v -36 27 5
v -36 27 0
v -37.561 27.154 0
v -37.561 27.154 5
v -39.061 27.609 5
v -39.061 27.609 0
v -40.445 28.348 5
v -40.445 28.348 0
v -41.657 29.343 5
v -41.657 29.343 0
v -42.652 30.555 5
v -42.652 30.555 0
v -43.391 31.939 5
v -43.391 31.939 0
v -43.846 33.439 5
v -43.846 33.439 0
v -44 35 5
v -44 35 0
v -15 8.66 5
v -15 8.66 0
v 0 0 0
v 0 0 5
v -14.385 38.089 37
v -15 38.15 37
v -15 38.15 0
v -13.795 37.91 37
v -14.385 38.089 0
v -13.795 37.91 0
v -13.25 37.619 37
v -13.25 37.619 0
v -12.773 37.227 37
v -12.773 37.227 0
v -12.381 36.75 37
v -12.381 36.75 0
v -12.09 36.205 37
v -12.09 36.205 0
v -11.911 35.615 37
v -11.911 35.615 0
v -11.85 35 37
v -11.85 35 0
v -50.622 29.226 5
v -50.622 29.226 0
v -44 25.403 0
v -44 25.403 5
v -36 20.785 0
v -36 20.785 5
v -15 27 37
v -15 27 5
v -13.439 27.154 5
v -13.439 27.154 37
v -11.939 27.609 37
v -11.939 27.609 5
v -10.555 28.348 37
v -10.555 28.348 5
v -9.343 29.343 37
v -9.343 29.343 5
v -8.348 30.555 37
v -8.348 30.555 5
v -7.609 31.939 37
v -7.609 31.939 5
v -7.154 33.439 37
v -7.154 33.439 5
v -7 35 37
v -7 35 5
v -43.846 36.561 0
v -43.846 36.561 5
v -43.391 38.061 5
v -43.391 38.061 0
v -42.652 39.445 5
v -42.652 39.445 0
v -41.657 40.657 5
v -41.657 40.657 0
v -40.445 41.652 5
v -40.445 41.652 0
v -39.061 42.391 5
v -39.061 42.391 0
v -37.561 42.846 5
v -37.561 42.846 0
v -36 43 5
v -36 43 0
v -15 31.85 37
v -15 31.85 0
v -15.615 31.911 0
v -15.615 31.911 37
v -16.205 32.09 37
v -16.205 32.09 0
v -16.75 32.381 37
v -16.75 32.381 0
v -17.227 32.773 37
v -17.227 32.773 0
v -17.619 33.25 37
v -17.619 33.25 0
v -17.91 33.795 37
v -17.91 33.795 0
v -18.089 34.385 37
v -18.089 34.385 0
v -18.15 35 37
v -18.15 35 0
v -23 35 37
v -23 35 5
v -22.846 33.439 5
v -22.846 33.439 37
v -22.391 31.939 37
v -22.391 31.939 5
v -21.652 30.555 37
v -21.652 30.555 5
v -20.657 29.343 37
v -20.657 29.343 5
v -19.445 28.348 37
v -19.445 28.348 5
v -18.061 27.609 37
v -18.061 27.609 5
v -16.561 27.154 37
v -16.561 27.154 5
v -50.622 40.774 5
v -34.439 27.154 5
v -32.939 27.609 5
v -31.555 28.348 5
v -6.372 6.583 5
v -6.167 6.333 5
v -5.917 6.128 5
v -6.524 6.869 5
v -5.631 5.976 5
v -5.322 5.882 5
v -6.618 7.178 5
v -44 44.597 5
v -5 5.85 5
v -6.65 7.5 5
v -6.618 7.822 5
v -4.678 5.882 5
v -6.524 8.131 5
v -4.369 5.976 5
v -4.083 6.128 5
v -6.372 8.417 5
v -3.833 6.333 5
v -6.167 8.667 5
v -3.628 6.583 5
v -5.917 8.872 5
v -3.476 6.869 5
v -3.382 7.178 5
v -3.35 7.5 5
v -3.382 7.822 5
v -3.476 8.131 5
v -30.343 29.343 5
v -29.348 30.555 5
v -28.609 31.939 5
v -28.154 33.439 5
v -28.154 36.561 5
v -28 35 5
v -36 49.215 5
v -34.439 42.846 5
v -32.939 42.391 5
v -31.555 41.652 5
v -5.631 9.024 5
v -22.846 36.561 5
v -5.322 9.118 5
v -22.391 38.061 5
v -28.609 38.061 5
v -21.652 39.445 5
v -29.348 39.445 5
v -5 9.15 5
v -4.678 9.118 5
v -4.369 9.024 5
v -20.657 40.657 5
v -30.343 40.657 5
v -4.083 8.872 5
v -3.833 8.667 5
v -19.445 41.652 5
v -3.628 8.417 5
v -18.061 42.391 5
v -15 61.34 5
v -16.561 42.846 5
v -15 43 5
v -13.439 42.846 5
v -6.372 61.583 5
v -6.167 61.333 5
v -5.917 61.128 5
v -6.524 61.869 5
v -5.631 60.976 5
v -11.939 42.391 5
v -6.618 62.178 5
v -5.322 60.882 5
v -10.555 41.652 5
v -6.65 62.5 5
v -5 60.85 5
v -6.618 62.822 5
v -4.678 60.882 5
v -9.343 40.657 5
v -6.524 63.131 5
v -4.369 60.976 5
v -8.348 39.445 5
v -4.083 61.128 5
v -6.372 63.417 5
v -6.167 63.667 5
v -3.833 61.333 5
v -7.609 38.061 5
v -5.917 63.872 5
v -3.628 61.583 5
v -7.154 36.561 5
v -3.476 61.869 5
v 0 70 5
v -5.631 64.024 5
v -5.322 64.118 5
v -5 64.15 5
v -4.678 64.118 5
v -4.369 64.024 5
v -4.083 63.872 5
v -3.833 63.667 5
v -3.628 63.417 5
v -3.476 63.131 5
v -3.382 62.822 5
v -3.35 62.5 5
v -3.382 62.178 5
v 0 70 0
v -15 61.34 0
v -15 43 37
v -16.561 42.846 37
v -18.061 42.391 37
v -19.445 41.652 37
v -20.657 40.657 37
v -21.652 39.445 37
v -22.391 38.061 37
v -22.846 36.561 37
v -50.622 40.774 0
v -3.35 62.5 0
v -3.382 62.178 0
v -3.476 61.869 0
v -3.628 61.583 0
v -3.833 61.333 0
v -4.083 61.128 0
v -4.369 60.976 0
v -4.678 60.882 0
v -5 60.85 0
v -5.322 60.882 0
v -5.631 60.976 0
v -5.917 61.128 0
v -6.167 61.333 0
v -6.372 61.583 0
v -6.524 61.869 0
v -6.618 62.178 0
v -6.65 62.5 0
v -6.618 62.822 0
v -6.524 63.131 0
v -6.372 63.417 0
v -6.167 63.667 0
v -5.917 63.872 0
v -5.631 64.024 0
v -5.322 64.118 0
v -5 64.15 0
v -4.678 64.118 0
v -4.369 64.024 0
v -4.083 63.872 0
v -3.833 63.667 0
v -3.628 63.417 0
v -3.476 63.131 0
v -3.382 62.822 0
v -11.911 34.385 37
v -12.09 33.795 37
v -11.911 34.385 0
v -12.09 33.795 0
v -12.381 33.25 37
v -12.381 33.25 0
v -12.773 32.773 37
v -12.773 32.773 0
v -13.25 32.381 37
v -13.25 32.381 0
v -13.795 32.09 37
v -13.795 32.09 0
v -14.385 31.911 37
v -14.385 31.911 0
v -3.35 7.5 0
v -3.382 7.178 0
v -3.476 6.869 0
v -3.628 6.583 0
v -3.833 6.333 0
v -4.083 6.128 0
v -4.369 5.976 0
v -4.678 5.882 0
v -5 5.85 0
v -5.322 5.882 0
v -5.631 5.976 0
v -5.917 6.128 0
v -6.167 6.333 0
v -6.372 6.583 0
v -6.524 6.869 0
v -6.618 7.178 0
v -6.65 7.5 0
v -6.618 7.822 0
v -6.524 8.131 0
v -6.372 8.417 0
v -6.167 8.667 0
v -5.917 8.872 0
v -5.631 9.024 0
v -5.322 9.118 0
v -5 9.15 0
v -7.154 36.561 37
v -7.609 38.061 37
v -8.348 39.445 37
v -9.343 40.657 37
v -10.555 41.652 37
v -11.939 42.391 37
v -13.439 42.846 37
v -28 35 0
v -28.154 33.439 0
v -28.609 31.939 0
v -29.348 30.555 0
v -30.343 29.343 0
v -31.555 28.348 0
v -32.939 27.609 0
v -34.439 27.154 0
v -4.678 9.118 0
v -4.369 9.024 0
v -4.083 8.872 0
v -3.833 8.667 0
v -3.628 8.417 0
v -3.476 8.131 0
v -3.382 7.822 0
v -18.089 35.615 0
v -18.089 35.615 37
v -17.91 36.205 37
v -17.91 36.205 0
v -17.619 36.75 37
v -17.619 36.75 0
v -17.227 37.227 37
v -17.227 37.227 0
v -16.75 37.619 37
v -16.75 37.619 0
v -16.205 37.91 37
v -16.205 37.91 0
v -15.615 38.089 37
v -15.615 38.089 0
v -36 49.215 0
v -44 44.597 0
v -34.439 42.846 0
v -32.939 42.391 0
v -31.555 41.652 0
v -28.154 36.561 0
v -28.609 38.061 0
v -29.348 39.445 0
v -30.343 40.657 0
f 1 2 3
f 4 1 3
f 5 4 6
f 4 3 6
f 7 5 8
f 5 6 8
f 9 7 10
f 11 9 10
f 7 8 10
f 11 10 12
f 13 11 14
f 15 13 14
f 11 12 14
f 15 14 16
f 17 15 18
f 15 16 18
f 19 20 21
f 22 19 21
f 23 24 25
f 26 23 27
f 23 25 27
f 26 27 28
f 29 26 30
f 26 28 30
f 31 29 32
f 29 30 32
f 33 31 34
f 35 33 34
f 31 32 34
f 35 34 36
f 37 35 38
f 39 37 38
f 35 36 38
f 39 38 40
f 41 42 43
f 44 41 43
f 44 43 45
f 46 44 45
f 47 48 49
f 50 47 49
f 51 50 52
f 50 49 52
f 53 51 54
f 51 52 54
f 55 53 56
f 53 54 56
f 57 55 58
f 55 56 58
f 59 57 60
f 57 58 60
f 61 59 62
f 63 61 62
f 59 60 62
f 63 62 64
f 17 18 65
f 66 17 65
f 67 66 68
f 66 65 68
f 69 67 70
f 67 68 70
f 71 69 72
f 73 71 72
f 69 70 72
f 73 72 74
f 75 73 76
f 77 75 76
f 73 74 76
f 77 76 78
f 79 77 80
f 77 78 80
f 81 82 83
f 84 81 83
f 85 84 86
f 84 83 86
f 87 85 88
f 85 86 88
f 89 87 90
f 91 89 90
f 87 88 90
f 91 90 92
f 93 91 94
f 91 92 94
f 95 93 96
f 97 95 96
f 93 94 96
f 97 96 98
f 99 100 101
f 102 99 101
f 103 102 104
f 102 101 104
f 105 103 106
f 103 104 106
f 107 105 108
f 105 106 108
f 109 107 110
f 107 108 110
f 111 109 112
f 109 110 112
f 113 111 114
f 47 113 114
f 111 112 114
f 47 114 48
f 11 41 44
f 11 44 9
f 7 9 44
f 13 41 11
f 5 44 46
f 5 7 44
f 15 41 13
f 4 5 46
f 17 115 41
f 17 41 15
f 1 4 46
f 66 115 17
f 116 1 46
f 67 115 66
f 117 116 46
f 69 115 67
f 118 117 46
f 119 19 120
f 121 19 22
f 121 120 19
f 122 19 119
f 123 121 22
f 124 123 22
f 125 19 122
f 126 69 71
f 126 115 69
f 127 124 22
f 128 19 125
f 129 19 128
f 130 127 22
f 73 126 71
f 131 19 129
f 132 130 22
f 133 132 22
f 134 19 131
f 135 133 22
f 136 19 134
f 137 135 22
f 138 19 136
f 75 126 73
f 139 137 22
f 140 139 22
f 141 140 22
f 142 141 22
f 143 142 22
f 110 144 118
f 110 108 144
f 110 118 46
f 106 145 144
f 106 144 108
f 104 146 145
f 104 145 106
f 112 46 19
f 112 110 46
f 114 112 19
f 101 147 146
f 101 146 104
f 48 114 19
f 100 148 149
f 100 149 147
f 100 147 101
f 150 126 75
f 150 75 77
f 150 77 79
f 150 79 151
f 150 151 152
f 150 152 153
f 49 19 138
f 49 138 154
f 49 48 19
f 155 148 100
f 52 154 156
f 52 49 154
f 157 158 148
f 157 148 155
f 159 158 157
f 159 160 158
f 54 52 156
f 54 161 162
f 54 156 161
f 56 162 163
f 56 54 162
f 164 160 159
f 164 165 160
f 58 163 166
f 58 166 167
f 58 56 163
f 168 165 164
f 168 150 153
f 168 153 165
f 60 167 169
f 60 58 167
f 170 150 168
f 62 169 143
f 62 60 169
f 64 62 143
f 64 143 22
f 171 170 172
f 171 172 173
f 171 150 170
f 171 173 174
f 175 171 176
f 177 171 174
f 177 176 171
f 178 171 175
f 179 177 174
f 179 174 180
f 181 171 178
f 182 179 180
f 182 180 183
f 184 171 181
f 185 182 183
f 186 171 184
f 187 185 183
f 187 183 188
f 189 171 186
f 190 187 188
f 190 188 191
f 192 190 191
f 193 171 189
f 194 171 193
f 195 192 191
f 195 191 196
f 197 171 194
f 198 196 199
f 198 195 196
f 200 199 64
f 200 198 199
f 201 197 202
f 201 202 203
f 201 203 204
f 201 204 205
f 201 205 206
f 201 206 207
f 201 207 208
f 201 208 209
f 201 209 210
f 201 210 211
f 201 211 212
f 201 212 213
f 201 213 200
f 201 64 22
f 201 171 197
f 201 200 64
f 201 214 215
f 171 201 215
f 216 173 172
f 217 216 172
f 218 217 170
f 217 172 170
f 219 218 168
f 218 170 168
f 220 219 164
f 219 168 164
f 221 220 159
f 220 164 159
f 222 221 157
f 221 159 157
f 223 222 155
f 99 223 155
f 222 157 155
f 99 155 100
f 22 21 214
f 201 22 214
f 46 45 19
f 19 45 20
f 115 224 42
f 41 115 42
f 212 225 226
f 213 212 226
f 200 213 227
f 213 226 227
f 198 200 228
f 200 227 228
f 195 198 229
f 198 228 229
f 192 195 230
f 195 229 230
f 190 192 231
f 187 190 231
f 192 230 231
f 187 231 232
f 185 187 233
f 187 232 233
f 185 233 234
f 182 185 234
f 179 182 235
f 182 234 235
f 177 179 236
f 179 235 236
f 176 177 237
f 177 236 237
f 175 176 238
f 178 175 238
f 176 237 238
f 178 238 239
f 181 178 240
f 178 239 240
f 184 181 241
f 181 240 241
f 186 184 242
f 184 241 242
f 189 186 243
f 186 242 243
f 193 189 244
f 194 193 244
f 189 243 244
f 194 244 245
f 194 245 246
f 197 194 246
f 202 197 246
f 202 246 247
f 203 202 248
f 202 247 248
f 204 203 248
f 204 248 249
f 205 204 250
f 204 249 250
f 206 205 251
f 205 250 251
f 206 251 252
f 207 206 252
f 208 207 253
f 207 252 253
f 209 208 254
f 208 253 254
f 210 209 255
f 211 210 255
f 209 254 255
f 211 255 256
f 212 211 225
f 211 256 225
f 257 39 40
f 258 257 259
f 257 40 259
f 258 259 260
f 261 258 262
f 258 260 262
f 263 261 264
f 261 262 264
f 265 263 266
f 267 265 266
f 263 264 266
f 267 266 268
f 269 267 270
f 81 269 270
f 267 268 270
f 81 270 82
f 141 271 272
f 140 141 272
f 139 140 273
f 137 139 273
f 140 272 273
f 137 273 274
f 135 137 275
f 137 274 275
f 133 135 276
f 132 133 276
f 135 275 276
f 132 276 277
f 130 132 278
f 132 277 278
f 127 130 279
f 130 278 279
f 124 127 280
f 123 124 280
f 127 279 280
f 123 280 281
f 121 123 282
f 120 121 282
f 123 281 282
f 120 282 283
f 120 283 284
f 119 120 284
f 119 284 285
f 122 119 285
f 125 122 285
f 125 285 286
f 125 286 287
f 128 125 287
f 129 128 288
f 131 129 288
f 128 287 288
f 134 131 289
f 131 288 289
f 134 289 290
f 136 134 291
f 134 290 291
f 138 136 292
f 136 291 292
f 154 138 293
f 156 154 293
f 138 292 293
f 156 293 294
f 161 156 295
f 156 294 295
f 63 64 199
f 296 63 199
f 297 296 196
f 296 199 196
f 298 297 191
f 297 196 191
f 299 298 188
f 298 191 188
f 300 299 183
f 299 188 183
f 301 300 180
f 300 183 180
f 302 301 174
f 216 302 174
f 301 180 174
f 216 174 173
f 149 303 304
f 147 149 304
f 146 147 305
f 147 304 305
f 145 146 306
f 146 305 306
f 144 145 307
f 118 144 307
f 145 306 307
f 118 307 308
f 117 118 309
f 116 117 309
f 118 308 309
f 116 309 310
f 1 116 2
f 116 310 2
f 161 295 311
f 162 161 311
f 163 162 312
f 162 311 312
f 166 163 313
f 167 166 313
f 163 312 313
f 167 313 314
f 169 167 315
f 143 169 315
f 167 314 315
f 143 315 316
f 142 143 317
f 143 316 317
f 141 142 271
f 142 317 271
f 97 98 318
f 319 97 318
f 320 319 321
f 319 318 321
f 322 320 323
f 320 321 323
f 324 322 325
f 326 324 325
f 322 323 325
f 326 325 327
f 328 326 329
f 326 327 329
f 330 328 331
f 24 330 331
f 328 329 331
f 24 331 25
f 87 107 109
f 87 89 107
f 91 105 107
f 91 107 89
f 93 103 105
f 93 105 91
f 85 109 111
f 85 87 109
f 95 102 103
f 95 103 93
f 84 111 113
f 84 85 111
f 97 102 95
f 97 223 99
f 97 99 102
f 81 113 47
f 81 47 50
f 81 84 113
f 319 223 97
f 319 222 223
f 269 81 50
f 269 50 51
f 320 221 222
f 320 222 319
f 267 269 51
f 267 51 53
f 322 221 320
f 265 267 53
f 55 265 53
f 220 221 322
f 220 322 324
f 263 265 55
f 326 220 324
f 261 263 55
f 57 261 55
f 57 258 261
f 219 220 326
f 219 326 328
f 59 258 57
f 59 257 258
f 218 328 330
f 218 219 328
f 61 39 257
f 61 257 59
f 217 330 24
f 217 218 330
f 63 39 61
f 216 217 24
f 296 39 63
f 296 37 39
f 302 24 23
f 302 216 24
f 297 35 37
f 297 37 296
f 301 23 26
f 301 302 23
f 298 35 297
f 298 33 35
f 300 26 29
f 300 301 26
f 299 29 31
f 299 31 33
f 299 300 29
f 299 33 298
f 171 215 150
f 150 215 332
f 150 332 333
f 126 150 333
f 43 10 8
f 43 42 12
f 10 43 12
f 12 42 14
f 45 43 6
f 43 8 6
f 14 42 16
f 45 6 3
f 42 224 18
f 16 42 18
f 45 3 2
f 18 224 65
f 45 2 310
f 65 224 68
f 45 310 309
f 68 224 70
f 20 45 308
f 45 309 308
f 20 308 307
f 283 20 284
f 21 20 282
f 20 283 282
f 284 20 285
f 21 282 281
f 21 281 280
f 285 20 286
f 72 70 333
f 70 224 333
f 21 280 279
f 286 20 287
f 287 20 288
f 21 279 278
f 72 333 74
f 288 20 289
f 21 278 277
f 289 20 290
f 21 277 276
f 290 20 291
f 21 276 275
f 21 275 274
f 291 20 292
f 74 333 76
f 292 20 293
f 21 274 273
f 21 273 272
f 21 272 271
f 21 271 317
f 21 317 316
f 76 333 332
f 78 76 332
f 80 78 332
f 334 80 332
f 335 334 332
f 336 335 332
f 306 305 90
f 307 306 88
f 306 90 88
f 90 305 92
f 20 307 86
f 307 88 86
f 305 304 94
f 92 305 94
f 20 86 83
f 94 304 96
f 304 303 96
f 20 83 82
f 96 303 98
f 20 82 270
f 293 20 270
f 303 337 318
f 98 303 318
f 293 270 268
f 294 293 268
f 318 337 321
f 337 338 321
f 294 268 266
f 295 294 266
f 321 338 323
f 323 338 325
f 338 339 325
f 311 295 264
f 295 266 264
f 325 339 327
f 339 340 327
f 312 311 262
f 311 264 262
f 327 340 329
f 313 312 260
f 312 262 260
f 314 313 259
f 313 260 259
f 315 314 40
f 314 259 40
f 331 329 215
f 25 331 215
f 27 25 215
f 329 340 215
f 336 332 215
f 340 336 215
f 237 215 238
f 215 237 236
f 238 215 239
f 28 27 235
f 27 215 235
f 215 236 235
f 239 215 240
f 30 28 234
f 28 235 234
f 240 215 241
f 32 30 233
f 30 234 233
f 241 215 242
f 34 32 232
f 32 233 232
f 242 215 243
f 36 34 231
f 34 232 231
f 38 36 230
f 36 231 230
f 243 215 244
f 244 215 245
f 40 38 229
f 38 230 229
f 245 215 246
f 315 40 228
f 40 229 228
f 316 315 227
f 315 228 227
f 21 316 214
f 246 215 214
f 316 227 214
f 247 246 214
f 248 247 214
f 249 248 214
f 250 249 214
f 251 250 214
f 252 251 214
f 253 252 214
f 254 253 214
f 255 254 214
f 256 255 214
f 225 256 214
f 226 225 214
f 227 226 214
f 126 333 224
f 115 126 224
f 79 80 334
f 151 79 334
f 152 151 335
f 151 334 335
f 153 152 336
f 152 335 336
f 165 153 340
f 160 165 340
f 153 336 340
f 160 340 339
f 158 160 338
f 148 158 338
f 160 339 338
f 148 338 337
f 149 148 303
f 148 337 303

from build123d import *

# Parameters (mm, degrees)
F1_DEPTH = 5
F2_DEPTH = 37


with BuildPart() as f1:
    # F0 (on Top) → F1 (new body)
    with BuildSketch(Plane.XY):
        with BuildLine():
            Line((-3.35, 62.5), (0, 62.5))
            Line((0, 62.5), (0, 70))
            Line((0, 70), (-15, 61.3397447815))
            Line((-15, 61.3397447815), (-15, 43))
            ThreePointArc((-15, 43), (-9.3431457505, 40.6568542495), (-7, 35))
            Line((-7, 35), (-5, 35))
            Line((-5, 35), (-5, 60.85))
            ThreePointArc((-5, 60.85), (-6.166726189, 63.666726189), (-3.35, 62.5))
        make_face()
        with BuildLine():
            Line((-5, 35), (0, 35))
            Line((0, 35), (0, 62.5))
            Line((0, 62.5), (-3.35, 62.5))
            ThreePointArc((-3.35, 62.5), (-3.833273811, 61.333273811), (-5, 60.85))
            Line((-5, 60.85), (-5, 35))
        make_face()
        with BuildLine():
            Line((-3.35, 7.5), (0, 7.5))
            Line((0, 7.5), (0, 35))
            Line((0, 35), (-5, 35))
            Line((-5, 35), (-5, 9.15))
            ThreePointArc((-5, 9.15), (-3.833273811, 8.666726189), (-3.35, 7.5))
        make_face()
        with BuildLine():
            Line((-15, 8.6602552185), (0, 0))
            Line((0, 0), (0, 7.5))
            Line((0, 7.5), (-3.35, 7.5))
            ThreePointArc((-3.35, 7.5), (-6.166726189, 6.333273811), (-5, 9.15))
            Line((-5, 9.15), (-5, 35))
            Line((-5, 35), (-7, 35))
            ThreePointArc((-7, 35), (-9.3431457505, 29.3431457505), (-15, 27))
            Line((-15, 27), (-15, 8.6602552185))
        make_face()
        with BuildLine():
            Line((-36, 20.7846125245), (-15, 8.6602552185))
            Line((-15, 8.6602552185), (-15, 27))
            ThreePointArc((-15, 27), (-20.6568542495, 29.3431457505), (-23, 35))
            Line((-23, 35), (-28, 35))
            ThreePointArc((-28, 35), (-30.3431457505, 29.3431457505), (-36, 27))
            Line((-36, 27), (-36, 20.7846125245))
        make_face()
        with BuildLine():
            Line((-28, 35), (-23, 35))
            ThreePointArc((-23, 35), (-20.6568542495, 40.6568542495), (-15, 43))
            Line((-15, 43), (-15, 61.3397447815))
            Line((-15, 61.3397447815), (-36, 49.2153874755))
            Line((-36, 49.2153874755), (-36, 43))
            ThreePointArc((-36, 43), (-30.3431457505, 40.6568542495), (-28, 35))
        make_face()
        with BuildLine():
            Line((-44, 44.5965846923), (-44, 35))
            ThreePointArc((-44, 35), (-41.6568542495, 40.6568542495), (-36, 43))
            Line((-36, 43), (-36, 49.2153874755))
            Line((-36, 49.2153874755), (-44, 44.5965846923))
        make_face()
        with BuildLine():
            Line((-44, 25.4034153077), (-36, 20.7846125245))
            Line((-36, 20.7846125245), (-36, 27))
            ThreePointArc((-36, 27), (-41.6568542495, 29.3431457505), (-44, 35))
            Line((-44, 35), (-44, 25.4034153077))
        make_face()
        Polygon((-50.62177, 29.226496521), (-44, 25.4034153077), (-44, 35), (-50.62177, 35), align=None)
        Polygon((-50.62177, 35), (-44, 35), (-44, 44.5965846923), (-50.62177, 40.773503479), align=None)
    extrude(amount=F1_DEPTH)

    # F0 (on Top) → F2 (join)
    with BuildSketch(Plane.XY):
        with BuildLine():
            ThreePointArc((-15, 43), (-20.6568542495, 40.6568542495), (-23, 35))
            Line((-23, 35), (-18.15, 35))
            ThreePointArc((-18.15, 35), (-17.2273863607, 37.2273863607), (-15, 38.15))
            Line((-15, 38.15), (-15, 43))
        make_face()
        with BuildLine():
            Line((-11.85, 35), (-7, 35))
            ThreePointArc((-7, 35), (-9.3431457505, 40.6568542495), (-15, 43))
            Line((-15, 43), (-15, 38.15))
            ThreePointArc((-15, 38.15), (-12.7726136393, 37.2273863607), (-11.85, 35))
        make_face()
        with BuildLine():
            Line((-15, 31.85), (-15, 27))
            ThreePointArc((-15, 27), (-9.3431457505, 29.3431457505), (-7, 35))
            Line((-7, 35), (-11.85, 35))
            ThreePointArc((-11.85, 35), (-12.7726136393, 32.7726136393), (-15, 31.85))
        make_face()
        with BuildLine():
            ThreePointArc((-23, 35), (-20.6568542495, 29.3431457505), (-15, 27))
            Line((-15, 27), (-15, 31.85))
            ThreePointArc((-15, 31.85), (-17.2273863607, 32.7726136393), (-18.15, 35))
            Line((-18.15, 35), (-23, 35))
        make_face()
    extrude(amount=F2_DEPTH)


solid = f1.part
